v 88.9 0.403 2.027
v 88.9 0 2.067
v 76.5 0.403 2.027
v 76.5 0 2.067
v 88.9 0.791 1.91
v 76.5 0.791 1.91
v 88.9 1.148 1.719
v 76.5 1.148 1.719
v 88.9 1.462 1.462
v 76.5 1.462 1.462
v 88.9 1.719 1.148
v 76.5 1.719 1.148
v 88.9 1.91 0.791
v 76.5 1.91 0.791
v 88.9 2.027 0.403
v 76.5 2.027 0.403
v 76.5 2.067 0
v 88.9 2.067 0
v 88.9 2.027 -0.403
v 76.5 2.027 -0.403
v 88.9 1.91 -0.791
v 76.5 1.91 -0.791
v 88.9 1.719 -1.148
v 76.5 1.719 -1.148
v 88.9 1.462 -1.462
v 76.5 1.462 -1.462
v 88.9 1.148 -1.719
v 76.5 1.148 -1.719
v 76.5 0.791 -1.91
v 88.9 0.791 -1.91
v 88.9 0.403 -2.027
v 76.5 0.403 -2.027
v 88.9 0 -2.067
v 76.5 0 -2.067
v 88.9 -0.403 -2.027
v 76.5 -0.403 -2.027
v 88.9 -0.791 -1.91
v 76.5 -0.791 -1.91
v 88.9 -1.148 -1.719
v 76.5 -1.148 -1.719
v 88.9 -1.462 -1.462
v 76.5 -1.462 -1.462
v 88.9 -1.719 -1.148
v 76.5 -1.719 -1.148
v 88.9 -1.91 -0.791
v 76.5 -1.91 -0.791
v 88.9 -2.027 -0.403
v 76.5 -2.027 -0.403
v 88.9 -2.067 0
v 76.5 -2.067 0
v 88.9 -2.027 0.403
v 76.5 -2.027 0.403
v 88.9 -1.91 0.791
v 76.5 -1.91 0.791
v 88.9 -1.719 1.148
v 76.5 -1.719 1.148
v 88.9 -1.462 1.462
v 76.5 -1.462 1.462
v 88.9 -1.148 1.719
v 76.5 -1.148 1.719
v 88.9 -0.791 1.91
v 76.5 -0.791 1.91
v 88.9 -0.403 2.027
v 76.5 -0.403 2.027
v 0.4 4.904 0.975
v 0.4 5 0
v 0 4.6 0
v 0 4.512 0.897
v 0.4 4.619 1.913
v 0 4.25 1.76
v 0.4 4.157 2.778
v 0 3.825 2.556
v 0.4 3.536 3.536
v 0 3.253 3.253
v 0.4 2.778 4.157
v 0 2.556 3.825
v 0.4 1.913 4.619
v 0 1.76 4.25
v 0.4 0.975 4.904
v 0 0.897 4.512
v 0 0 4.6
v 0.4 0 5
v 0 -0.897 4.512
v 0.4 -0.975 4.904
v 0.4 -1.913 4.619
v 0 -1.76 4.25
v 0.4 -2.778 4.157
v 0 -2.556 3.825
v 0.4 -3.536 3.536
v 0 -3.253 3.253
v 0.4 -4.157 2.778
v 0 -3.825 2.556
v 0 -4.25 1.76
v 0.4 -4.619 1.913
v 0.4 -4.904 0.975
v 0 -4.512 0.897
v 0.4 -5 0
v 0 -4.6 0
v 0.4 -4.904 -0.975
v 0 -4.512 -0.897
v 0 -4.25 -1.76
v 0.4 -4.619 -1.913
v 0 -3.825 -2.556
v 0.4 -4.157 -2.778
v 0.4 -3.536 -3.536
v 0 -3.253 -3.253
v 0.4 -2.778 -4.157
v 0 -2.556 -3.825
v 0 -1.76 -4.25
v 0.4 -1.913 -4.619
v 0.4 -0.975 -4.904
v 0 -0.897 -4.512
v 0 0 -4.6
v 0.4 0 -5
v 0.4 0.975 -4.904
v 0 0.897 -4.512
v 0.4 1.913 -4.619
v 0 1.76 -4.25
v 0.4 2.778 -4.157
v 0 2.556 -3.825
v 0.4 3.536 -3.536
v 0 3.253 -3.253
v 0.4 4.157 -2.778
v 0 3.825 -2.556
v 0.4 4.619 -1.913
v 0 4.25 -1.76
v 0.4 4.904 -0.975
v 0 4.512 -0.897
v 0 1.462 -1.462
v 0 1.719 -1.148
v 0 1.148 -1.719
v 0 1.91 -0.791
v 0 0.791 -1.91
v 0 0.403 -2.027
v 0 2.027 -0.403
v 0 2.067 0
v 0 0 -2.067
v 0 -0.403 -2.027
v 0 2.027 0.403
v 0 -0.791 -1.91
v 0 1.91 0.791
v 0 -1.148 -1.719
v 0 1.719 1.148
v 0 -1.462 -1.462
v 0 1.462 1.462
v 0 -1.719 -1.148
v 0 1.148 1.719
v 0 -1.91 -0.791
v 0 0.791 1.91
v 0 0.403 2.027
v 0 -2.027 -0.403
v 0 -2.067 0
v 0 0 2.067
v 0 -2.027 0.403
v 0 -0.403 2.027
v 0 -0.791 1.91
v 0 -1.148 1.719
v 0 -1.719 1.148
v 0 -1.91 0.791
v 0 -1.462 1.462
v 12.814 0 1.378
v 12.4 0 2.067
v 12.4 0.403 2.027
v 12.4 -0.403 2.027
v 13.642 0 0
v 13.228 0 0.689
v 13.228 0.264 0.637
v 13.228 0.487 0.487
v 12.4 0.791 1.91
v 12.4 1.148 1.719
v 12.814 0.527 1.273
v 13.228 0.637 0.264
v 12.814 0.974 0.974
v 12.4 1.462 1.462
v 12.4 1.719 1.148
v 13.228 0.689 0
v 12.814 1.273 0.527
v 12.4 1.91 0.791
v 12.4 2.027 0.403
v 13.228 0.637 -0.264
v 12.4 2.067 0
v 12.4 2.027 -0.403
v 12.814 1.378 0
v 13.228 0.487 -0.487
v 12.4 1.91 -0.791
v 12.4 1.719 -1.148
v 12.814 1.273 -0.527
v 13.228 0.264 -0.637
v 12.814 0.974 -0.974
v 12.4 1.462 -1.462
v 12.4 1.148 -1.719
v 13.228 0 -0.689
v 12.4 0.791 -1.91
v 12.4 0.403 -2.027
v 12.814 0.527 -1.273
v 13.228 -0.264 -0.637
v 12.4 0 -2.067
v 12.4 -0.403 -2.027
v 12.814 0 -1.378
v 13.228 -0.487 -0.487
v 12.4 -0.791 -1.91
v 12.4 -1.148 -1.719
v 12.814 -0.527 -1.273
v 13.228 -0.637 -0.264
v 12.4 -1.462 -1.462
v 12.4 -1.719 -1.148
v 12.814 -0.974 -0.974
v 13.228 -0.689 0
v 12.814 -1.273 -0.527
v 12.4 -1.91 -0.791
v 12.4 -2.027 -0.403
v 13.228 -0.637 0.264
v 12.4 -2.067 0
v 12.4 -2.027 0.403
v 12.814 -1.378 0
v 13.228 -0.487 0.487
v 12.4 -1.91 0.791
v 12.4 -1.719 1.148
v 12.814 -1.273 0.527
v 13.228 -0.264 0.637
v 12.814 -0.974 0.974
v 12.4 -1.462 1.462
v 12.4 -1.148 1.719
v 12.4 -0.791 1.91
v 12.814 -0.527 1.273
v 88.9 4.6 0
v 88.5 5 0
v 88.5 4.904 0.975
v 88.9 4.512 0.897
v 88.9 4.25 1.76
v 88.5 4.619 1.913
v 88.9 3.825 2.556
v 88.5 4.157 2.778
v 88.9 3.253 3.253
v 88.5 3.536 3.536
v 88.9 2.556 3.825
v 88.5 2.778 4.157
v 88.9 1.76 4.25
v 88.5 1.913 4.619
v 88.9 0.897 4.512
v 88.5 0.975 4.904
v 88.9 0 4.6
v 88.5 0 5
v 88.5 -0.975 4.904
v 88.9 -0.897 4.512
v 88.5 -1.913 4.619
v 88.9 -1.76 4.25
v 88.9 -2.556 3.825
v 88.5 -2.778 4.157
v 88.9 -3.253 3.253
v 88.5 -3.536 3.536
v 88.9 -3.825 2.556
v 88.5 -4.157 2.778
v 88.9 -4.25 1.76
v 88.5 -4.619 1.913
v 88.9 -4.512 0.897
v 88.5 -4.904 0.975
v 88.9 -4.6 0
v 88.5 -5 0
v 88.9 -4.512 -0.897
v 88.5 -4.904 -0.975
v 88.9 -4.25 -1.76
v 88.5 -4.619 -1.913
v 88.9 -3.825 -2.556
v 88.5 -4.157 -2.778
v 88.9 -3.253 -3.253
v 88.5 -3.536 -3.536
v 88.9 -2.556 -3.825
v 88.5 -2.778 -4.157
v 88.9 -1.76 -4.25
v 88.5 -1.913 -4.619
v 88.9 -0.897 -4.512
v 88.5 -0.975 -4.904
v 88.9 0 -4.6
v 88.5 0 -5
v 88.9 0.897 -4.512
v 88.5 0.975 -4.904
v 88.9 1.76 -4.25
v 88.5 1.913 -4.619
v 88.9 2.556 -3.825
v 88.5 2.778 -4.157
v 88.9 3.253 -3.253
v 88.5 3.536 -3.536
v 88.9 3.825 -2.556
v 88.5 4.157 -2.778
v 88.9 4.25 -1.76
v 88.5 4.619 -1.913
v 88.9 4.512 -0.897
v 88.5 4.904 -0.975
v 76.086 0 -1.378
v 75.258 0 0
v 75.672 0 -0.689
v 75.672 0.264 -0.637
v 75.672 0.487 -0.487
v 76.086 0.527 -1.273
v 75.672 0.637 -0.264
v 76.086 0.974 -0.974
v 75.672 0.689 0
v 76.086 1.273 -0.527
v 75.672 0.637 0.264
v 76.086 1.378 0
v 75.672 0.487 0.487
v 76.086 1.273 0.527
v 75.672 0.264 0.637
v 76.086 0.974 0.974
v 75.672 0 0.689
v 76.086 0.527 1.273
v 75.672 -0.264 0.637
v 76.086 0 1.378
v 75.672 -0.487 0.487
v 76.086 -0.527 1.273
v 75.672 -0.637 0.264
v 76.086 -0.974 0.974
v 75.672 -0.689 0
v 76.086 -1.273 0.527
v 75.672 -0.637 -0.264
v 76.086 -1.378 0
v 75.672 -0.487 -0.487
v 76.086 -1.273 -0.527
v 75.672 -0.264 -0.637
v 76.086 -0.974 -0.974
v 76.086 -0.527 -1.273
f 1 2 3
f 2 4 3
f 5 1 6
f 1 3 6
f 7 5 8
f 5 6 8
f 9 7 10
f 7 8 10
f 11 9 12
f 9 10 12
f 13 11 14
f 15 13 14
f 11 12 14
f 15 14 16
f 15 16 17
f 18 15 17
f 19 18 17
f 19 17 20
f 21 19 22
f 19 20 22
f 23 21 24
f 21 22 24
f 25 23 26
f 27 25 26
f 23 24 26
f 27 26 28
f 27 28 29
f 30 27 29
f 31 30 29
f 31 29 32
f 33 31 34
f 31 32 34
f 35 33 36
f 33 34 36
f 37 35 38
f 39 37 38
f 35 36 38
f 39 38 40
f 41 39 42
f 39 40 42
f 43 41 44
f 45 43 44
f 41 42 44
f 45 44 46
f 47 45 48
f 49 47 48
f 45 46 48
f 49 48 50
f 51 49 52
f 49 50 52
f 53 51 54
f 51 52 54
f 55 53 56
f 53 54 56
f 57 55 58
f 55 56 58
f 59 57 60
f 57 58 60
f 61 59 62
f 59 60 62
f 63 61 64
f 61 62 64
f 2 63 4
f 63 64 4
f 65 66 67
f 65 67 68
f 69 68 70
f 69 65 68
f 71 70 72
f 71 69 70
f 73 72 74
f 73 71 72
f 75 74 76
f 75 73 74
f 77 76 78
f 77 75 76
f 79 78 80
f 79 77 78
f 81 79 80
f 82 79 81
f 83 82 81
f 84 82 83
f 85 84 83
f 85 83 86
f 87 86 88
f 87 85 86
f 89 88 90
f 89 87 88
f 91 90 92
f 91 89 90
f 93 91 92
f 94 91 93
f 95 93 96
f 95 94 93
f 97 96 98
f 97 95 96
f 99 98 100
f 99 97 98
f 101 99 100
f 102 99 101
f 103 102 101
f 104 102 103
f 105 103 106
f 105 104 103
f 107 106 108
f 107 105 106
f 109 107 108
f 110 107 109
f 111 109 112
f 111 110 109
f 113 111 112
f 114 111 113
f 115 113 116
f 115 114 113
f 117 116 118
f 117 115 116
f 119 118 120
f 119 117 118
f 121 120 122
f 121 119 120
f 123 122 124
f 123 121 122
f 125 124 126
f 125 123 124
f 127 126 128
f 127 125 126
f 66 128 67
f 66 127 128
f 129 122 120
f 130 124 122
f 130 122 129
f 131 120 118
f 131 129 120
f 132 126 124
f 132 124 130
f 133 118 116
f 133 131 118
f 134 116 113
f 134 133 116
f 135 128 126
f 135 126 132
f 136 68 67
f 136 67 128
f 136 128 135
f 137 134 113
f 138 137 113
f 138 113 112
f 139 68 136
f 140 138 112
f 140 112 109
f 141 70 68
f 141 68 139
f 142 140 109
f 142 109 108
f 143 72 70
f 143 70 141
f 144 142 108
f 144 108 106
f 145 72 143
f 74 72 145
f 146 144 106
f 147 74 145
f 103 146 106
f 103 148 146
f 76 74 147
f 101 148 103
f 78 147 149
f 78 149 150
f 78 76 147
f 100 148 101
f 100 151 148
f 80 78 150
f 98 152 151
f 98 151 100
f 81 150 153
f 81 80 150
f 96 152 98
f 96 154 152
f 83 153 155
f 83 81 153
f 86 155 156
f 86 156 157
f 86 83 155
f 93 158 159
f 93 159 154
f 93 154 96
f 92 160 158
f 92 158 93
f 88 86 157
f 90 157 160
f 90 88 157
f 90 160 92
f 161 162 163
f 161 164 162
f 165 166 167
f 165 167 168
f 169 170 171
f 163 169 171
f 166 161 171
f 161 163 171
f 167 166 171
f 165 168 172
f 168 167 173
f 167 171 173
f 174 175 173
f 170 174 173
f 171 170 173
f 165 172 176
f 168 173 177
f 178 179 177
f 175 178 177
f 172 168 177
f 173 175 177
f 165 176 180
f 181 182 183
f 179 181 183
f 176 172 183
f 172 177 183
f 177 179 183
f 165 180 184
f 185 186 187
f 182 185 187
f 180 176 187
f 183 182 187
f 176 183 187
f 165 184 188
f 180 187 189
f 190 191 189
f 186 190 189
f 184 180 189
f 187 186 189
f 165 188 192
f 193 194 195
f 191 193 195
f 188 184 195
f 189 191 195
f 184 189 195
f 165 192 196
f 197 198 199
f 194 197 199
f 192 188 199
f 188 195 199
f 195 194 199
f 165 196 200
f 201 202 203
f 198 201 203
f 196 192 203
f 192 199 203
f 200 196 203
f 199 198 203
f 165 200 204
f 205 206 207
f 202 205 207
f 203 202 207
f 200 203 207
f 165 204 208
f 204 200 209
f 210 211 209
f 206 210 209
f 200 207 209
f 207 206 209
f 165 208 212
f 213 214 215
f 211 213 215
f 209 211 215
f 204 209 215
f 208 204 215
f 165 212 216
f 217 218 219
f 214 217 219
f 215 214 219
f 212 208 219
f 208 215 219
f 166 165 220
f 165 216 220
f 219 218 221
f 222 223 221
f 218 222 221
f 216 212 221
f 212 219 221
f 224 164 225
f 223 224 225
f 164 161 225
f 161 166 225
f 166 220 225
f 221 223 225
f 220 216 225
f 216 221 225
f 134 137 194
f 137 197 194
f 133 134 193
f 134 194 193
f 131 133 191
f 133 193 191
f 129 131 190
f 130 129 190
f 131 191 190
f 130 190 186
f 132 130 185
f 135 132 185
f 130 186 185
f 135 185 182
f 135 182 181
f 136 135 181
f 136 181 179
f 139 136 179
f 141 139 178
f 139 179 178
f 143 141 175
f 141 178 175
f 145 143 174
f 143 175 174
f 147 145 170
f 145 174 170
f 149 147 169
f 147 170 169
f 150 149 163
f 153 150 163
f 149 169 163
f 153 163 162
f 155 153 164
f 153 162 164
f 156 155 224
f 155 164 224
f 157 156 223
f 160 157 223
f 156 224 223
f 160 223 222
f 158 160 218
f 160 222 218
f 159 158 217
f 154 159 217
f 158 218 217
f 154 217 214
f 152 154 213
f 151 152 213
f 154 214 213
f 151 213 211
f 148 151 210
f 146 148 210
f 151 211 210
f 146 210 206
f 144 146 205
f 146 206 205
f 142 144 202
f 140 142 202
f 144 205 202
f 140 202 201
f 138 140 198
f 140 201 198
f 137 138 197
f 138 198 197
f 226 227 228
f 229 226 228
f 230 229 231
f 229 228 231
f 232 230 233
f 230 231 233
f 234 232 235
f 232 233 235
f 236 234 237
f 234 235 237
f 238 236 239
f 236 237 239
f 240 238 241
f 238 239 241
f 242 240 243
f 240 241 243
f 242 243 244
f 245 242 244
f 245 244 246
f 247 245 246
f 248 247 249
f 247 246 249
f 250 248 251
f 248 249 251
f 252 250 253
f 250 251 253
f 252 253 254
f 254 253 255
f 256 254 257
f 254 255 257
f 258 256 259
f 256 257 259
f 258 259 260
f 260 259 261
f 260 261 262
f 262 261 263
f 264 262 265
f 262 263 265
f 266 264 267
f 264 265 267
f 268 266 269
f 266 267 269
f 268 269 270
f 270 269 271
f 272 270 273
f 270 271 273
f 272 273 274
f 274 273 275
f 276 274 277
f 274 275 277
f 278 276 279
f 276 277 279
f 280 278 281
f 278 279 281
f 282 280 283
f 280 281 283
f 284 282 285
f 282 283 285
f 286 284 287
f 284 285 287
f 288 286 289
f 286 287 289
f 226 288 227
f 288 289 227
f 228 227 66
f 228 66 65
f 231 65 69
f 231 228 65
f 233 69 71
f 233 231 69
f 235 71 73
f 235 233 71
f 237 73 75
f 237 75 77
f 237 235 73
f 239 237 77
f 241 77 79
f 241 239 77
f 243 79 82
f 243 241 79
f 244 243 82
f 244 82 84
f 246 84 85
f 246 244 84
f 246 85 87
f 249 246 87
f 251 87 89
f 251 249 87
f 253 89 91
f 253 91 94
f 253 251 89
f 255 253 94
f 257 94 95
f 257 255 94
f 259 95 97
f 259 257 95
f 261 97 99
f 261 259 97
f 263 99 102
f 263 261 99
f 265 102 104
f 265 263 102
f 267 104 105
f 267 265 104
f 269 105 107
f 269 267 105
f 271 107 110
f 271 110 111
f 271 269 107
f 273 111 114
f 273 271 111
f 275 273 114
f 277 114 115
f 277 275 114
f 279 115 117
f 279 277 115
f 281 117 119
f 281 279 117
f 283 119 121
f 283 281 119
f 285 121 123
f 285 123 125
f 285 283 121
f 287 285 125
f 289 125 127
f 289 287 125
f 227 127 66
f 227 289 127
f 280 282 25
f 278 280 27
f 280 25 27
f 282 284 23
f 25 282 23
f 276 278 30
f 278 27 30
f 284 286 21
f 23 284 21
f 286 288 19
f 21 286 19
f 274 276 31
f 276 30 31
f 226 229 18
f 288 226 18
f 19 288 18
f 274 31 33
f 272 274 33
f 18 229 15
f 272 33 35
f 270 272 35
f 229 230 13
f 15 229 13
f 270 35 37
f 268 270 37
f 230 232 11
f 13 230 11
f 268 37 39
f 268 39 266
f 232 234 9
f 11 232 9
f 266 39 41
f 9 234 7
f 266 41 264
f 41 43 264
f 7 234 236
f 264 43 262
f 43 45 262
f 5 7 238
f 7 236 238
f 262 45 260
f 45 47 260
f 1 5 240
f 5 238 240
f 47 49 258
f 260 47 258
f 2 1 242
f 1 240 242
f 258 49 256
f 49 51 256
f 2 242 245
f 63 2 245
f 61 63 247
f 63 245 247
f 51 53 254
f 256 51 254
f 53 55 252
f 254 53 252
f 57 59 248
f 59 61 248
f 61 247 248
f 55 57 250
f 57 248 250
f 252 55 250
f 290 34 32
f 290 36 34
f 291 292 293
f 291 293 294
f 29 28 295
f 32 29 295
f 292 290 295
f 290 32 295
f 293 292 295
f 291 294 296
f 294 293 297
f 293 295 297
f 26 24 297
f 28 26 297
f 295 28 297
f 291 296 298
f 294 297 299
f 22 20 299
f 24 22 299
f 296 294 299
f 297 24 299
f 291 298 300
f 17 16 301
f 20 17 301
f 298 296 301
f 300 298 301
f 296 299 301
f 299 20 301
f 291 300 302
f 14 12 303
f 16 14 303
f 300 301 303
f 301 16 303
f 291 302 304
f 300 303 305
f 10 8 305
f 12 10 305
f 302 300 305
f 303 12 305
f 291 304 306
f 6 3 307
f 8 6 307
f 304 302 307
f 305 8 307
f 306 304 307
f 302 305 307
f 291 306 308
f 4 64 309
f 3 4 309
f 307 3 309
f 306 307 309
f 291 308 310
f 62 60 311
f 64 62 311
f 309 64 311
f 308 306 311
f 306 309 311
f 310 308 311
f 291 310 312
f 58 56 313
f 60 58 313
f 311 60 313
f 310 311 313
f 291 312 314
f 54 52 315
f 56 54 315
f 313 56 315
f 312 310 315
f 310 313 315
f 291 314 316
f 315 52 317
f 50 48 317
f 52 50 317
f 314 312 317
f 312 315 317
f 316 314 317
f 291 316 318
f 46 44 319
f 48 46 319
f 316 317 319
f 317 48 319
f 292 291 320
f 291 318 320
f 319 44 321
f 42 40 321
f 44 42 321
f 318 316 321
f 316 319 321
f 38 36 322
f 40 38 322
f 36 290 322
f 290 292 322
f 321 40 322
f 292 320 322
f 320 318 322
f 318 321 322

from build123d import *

# Parameters (mm, degrees)
SKETCH1_W     = 88.9
SKETCH1_H     = 5
CHAMFER1_SIZE = 0.4
TAP4_D        = 4.134
TAP4_DEPTH    = 12.4
TAP4_TIP      = 1.2419789
TAP5_D        = 4.134
TAP5_DEPTH    = 12.4
TAP5_TIP      = 1.2419789


with BuildPart() as part:
    # Sketch1 → Revolve1 (revolve)
    with BuildSketch(Plane.XY):
        with Locations((44.45, 2.5)):
            Rectangle(SKETCH1_W, SKETCH1_H)
    revolve(axis=Axis((0, 0, 0), (1, 0, 0)))

    # Chamfer1
    chamfer1_edges = [part.edges().sort_by_distance(p)[0] for p in [
        (0, -5, 0),
        (88.9, -5, 0),
    ]]
    chamfer(chamfer1_edges, length=CHAMFER1_SIZE)

    # Tap4
    with Locations(Plane.ZY):
        with Locations((0, 0)):
            Hole(TAP4_D / 2, depth=TAP4_DEPTH)
            with Locations((0, 0, -(TAP4_DEPTH + TAP4_TIP / 2))):  # 118° drill point
                Cone(0, TAP4_D / 2, TAP4_TIP, mode=Mode.SUBTRACT)

    # Tap5
    with Locations(Plane(origin=(88.9, 0, 0), x_dir=(0, 0, -1), z_dir=(1, 0, 0))):
        with Locations((0, 0)):
            Hole(TAP5_D / 2, depth=TAP5_DEPTH)
            with Locations((0, 0, -(TAP5_DEPTH + TAP5_TIP / 2))):  # 118° drill point
                Cone(0, TAP5_D / 2, TAP5_TIP, mode=Mode.SUBTRACT)


solid = part.part
